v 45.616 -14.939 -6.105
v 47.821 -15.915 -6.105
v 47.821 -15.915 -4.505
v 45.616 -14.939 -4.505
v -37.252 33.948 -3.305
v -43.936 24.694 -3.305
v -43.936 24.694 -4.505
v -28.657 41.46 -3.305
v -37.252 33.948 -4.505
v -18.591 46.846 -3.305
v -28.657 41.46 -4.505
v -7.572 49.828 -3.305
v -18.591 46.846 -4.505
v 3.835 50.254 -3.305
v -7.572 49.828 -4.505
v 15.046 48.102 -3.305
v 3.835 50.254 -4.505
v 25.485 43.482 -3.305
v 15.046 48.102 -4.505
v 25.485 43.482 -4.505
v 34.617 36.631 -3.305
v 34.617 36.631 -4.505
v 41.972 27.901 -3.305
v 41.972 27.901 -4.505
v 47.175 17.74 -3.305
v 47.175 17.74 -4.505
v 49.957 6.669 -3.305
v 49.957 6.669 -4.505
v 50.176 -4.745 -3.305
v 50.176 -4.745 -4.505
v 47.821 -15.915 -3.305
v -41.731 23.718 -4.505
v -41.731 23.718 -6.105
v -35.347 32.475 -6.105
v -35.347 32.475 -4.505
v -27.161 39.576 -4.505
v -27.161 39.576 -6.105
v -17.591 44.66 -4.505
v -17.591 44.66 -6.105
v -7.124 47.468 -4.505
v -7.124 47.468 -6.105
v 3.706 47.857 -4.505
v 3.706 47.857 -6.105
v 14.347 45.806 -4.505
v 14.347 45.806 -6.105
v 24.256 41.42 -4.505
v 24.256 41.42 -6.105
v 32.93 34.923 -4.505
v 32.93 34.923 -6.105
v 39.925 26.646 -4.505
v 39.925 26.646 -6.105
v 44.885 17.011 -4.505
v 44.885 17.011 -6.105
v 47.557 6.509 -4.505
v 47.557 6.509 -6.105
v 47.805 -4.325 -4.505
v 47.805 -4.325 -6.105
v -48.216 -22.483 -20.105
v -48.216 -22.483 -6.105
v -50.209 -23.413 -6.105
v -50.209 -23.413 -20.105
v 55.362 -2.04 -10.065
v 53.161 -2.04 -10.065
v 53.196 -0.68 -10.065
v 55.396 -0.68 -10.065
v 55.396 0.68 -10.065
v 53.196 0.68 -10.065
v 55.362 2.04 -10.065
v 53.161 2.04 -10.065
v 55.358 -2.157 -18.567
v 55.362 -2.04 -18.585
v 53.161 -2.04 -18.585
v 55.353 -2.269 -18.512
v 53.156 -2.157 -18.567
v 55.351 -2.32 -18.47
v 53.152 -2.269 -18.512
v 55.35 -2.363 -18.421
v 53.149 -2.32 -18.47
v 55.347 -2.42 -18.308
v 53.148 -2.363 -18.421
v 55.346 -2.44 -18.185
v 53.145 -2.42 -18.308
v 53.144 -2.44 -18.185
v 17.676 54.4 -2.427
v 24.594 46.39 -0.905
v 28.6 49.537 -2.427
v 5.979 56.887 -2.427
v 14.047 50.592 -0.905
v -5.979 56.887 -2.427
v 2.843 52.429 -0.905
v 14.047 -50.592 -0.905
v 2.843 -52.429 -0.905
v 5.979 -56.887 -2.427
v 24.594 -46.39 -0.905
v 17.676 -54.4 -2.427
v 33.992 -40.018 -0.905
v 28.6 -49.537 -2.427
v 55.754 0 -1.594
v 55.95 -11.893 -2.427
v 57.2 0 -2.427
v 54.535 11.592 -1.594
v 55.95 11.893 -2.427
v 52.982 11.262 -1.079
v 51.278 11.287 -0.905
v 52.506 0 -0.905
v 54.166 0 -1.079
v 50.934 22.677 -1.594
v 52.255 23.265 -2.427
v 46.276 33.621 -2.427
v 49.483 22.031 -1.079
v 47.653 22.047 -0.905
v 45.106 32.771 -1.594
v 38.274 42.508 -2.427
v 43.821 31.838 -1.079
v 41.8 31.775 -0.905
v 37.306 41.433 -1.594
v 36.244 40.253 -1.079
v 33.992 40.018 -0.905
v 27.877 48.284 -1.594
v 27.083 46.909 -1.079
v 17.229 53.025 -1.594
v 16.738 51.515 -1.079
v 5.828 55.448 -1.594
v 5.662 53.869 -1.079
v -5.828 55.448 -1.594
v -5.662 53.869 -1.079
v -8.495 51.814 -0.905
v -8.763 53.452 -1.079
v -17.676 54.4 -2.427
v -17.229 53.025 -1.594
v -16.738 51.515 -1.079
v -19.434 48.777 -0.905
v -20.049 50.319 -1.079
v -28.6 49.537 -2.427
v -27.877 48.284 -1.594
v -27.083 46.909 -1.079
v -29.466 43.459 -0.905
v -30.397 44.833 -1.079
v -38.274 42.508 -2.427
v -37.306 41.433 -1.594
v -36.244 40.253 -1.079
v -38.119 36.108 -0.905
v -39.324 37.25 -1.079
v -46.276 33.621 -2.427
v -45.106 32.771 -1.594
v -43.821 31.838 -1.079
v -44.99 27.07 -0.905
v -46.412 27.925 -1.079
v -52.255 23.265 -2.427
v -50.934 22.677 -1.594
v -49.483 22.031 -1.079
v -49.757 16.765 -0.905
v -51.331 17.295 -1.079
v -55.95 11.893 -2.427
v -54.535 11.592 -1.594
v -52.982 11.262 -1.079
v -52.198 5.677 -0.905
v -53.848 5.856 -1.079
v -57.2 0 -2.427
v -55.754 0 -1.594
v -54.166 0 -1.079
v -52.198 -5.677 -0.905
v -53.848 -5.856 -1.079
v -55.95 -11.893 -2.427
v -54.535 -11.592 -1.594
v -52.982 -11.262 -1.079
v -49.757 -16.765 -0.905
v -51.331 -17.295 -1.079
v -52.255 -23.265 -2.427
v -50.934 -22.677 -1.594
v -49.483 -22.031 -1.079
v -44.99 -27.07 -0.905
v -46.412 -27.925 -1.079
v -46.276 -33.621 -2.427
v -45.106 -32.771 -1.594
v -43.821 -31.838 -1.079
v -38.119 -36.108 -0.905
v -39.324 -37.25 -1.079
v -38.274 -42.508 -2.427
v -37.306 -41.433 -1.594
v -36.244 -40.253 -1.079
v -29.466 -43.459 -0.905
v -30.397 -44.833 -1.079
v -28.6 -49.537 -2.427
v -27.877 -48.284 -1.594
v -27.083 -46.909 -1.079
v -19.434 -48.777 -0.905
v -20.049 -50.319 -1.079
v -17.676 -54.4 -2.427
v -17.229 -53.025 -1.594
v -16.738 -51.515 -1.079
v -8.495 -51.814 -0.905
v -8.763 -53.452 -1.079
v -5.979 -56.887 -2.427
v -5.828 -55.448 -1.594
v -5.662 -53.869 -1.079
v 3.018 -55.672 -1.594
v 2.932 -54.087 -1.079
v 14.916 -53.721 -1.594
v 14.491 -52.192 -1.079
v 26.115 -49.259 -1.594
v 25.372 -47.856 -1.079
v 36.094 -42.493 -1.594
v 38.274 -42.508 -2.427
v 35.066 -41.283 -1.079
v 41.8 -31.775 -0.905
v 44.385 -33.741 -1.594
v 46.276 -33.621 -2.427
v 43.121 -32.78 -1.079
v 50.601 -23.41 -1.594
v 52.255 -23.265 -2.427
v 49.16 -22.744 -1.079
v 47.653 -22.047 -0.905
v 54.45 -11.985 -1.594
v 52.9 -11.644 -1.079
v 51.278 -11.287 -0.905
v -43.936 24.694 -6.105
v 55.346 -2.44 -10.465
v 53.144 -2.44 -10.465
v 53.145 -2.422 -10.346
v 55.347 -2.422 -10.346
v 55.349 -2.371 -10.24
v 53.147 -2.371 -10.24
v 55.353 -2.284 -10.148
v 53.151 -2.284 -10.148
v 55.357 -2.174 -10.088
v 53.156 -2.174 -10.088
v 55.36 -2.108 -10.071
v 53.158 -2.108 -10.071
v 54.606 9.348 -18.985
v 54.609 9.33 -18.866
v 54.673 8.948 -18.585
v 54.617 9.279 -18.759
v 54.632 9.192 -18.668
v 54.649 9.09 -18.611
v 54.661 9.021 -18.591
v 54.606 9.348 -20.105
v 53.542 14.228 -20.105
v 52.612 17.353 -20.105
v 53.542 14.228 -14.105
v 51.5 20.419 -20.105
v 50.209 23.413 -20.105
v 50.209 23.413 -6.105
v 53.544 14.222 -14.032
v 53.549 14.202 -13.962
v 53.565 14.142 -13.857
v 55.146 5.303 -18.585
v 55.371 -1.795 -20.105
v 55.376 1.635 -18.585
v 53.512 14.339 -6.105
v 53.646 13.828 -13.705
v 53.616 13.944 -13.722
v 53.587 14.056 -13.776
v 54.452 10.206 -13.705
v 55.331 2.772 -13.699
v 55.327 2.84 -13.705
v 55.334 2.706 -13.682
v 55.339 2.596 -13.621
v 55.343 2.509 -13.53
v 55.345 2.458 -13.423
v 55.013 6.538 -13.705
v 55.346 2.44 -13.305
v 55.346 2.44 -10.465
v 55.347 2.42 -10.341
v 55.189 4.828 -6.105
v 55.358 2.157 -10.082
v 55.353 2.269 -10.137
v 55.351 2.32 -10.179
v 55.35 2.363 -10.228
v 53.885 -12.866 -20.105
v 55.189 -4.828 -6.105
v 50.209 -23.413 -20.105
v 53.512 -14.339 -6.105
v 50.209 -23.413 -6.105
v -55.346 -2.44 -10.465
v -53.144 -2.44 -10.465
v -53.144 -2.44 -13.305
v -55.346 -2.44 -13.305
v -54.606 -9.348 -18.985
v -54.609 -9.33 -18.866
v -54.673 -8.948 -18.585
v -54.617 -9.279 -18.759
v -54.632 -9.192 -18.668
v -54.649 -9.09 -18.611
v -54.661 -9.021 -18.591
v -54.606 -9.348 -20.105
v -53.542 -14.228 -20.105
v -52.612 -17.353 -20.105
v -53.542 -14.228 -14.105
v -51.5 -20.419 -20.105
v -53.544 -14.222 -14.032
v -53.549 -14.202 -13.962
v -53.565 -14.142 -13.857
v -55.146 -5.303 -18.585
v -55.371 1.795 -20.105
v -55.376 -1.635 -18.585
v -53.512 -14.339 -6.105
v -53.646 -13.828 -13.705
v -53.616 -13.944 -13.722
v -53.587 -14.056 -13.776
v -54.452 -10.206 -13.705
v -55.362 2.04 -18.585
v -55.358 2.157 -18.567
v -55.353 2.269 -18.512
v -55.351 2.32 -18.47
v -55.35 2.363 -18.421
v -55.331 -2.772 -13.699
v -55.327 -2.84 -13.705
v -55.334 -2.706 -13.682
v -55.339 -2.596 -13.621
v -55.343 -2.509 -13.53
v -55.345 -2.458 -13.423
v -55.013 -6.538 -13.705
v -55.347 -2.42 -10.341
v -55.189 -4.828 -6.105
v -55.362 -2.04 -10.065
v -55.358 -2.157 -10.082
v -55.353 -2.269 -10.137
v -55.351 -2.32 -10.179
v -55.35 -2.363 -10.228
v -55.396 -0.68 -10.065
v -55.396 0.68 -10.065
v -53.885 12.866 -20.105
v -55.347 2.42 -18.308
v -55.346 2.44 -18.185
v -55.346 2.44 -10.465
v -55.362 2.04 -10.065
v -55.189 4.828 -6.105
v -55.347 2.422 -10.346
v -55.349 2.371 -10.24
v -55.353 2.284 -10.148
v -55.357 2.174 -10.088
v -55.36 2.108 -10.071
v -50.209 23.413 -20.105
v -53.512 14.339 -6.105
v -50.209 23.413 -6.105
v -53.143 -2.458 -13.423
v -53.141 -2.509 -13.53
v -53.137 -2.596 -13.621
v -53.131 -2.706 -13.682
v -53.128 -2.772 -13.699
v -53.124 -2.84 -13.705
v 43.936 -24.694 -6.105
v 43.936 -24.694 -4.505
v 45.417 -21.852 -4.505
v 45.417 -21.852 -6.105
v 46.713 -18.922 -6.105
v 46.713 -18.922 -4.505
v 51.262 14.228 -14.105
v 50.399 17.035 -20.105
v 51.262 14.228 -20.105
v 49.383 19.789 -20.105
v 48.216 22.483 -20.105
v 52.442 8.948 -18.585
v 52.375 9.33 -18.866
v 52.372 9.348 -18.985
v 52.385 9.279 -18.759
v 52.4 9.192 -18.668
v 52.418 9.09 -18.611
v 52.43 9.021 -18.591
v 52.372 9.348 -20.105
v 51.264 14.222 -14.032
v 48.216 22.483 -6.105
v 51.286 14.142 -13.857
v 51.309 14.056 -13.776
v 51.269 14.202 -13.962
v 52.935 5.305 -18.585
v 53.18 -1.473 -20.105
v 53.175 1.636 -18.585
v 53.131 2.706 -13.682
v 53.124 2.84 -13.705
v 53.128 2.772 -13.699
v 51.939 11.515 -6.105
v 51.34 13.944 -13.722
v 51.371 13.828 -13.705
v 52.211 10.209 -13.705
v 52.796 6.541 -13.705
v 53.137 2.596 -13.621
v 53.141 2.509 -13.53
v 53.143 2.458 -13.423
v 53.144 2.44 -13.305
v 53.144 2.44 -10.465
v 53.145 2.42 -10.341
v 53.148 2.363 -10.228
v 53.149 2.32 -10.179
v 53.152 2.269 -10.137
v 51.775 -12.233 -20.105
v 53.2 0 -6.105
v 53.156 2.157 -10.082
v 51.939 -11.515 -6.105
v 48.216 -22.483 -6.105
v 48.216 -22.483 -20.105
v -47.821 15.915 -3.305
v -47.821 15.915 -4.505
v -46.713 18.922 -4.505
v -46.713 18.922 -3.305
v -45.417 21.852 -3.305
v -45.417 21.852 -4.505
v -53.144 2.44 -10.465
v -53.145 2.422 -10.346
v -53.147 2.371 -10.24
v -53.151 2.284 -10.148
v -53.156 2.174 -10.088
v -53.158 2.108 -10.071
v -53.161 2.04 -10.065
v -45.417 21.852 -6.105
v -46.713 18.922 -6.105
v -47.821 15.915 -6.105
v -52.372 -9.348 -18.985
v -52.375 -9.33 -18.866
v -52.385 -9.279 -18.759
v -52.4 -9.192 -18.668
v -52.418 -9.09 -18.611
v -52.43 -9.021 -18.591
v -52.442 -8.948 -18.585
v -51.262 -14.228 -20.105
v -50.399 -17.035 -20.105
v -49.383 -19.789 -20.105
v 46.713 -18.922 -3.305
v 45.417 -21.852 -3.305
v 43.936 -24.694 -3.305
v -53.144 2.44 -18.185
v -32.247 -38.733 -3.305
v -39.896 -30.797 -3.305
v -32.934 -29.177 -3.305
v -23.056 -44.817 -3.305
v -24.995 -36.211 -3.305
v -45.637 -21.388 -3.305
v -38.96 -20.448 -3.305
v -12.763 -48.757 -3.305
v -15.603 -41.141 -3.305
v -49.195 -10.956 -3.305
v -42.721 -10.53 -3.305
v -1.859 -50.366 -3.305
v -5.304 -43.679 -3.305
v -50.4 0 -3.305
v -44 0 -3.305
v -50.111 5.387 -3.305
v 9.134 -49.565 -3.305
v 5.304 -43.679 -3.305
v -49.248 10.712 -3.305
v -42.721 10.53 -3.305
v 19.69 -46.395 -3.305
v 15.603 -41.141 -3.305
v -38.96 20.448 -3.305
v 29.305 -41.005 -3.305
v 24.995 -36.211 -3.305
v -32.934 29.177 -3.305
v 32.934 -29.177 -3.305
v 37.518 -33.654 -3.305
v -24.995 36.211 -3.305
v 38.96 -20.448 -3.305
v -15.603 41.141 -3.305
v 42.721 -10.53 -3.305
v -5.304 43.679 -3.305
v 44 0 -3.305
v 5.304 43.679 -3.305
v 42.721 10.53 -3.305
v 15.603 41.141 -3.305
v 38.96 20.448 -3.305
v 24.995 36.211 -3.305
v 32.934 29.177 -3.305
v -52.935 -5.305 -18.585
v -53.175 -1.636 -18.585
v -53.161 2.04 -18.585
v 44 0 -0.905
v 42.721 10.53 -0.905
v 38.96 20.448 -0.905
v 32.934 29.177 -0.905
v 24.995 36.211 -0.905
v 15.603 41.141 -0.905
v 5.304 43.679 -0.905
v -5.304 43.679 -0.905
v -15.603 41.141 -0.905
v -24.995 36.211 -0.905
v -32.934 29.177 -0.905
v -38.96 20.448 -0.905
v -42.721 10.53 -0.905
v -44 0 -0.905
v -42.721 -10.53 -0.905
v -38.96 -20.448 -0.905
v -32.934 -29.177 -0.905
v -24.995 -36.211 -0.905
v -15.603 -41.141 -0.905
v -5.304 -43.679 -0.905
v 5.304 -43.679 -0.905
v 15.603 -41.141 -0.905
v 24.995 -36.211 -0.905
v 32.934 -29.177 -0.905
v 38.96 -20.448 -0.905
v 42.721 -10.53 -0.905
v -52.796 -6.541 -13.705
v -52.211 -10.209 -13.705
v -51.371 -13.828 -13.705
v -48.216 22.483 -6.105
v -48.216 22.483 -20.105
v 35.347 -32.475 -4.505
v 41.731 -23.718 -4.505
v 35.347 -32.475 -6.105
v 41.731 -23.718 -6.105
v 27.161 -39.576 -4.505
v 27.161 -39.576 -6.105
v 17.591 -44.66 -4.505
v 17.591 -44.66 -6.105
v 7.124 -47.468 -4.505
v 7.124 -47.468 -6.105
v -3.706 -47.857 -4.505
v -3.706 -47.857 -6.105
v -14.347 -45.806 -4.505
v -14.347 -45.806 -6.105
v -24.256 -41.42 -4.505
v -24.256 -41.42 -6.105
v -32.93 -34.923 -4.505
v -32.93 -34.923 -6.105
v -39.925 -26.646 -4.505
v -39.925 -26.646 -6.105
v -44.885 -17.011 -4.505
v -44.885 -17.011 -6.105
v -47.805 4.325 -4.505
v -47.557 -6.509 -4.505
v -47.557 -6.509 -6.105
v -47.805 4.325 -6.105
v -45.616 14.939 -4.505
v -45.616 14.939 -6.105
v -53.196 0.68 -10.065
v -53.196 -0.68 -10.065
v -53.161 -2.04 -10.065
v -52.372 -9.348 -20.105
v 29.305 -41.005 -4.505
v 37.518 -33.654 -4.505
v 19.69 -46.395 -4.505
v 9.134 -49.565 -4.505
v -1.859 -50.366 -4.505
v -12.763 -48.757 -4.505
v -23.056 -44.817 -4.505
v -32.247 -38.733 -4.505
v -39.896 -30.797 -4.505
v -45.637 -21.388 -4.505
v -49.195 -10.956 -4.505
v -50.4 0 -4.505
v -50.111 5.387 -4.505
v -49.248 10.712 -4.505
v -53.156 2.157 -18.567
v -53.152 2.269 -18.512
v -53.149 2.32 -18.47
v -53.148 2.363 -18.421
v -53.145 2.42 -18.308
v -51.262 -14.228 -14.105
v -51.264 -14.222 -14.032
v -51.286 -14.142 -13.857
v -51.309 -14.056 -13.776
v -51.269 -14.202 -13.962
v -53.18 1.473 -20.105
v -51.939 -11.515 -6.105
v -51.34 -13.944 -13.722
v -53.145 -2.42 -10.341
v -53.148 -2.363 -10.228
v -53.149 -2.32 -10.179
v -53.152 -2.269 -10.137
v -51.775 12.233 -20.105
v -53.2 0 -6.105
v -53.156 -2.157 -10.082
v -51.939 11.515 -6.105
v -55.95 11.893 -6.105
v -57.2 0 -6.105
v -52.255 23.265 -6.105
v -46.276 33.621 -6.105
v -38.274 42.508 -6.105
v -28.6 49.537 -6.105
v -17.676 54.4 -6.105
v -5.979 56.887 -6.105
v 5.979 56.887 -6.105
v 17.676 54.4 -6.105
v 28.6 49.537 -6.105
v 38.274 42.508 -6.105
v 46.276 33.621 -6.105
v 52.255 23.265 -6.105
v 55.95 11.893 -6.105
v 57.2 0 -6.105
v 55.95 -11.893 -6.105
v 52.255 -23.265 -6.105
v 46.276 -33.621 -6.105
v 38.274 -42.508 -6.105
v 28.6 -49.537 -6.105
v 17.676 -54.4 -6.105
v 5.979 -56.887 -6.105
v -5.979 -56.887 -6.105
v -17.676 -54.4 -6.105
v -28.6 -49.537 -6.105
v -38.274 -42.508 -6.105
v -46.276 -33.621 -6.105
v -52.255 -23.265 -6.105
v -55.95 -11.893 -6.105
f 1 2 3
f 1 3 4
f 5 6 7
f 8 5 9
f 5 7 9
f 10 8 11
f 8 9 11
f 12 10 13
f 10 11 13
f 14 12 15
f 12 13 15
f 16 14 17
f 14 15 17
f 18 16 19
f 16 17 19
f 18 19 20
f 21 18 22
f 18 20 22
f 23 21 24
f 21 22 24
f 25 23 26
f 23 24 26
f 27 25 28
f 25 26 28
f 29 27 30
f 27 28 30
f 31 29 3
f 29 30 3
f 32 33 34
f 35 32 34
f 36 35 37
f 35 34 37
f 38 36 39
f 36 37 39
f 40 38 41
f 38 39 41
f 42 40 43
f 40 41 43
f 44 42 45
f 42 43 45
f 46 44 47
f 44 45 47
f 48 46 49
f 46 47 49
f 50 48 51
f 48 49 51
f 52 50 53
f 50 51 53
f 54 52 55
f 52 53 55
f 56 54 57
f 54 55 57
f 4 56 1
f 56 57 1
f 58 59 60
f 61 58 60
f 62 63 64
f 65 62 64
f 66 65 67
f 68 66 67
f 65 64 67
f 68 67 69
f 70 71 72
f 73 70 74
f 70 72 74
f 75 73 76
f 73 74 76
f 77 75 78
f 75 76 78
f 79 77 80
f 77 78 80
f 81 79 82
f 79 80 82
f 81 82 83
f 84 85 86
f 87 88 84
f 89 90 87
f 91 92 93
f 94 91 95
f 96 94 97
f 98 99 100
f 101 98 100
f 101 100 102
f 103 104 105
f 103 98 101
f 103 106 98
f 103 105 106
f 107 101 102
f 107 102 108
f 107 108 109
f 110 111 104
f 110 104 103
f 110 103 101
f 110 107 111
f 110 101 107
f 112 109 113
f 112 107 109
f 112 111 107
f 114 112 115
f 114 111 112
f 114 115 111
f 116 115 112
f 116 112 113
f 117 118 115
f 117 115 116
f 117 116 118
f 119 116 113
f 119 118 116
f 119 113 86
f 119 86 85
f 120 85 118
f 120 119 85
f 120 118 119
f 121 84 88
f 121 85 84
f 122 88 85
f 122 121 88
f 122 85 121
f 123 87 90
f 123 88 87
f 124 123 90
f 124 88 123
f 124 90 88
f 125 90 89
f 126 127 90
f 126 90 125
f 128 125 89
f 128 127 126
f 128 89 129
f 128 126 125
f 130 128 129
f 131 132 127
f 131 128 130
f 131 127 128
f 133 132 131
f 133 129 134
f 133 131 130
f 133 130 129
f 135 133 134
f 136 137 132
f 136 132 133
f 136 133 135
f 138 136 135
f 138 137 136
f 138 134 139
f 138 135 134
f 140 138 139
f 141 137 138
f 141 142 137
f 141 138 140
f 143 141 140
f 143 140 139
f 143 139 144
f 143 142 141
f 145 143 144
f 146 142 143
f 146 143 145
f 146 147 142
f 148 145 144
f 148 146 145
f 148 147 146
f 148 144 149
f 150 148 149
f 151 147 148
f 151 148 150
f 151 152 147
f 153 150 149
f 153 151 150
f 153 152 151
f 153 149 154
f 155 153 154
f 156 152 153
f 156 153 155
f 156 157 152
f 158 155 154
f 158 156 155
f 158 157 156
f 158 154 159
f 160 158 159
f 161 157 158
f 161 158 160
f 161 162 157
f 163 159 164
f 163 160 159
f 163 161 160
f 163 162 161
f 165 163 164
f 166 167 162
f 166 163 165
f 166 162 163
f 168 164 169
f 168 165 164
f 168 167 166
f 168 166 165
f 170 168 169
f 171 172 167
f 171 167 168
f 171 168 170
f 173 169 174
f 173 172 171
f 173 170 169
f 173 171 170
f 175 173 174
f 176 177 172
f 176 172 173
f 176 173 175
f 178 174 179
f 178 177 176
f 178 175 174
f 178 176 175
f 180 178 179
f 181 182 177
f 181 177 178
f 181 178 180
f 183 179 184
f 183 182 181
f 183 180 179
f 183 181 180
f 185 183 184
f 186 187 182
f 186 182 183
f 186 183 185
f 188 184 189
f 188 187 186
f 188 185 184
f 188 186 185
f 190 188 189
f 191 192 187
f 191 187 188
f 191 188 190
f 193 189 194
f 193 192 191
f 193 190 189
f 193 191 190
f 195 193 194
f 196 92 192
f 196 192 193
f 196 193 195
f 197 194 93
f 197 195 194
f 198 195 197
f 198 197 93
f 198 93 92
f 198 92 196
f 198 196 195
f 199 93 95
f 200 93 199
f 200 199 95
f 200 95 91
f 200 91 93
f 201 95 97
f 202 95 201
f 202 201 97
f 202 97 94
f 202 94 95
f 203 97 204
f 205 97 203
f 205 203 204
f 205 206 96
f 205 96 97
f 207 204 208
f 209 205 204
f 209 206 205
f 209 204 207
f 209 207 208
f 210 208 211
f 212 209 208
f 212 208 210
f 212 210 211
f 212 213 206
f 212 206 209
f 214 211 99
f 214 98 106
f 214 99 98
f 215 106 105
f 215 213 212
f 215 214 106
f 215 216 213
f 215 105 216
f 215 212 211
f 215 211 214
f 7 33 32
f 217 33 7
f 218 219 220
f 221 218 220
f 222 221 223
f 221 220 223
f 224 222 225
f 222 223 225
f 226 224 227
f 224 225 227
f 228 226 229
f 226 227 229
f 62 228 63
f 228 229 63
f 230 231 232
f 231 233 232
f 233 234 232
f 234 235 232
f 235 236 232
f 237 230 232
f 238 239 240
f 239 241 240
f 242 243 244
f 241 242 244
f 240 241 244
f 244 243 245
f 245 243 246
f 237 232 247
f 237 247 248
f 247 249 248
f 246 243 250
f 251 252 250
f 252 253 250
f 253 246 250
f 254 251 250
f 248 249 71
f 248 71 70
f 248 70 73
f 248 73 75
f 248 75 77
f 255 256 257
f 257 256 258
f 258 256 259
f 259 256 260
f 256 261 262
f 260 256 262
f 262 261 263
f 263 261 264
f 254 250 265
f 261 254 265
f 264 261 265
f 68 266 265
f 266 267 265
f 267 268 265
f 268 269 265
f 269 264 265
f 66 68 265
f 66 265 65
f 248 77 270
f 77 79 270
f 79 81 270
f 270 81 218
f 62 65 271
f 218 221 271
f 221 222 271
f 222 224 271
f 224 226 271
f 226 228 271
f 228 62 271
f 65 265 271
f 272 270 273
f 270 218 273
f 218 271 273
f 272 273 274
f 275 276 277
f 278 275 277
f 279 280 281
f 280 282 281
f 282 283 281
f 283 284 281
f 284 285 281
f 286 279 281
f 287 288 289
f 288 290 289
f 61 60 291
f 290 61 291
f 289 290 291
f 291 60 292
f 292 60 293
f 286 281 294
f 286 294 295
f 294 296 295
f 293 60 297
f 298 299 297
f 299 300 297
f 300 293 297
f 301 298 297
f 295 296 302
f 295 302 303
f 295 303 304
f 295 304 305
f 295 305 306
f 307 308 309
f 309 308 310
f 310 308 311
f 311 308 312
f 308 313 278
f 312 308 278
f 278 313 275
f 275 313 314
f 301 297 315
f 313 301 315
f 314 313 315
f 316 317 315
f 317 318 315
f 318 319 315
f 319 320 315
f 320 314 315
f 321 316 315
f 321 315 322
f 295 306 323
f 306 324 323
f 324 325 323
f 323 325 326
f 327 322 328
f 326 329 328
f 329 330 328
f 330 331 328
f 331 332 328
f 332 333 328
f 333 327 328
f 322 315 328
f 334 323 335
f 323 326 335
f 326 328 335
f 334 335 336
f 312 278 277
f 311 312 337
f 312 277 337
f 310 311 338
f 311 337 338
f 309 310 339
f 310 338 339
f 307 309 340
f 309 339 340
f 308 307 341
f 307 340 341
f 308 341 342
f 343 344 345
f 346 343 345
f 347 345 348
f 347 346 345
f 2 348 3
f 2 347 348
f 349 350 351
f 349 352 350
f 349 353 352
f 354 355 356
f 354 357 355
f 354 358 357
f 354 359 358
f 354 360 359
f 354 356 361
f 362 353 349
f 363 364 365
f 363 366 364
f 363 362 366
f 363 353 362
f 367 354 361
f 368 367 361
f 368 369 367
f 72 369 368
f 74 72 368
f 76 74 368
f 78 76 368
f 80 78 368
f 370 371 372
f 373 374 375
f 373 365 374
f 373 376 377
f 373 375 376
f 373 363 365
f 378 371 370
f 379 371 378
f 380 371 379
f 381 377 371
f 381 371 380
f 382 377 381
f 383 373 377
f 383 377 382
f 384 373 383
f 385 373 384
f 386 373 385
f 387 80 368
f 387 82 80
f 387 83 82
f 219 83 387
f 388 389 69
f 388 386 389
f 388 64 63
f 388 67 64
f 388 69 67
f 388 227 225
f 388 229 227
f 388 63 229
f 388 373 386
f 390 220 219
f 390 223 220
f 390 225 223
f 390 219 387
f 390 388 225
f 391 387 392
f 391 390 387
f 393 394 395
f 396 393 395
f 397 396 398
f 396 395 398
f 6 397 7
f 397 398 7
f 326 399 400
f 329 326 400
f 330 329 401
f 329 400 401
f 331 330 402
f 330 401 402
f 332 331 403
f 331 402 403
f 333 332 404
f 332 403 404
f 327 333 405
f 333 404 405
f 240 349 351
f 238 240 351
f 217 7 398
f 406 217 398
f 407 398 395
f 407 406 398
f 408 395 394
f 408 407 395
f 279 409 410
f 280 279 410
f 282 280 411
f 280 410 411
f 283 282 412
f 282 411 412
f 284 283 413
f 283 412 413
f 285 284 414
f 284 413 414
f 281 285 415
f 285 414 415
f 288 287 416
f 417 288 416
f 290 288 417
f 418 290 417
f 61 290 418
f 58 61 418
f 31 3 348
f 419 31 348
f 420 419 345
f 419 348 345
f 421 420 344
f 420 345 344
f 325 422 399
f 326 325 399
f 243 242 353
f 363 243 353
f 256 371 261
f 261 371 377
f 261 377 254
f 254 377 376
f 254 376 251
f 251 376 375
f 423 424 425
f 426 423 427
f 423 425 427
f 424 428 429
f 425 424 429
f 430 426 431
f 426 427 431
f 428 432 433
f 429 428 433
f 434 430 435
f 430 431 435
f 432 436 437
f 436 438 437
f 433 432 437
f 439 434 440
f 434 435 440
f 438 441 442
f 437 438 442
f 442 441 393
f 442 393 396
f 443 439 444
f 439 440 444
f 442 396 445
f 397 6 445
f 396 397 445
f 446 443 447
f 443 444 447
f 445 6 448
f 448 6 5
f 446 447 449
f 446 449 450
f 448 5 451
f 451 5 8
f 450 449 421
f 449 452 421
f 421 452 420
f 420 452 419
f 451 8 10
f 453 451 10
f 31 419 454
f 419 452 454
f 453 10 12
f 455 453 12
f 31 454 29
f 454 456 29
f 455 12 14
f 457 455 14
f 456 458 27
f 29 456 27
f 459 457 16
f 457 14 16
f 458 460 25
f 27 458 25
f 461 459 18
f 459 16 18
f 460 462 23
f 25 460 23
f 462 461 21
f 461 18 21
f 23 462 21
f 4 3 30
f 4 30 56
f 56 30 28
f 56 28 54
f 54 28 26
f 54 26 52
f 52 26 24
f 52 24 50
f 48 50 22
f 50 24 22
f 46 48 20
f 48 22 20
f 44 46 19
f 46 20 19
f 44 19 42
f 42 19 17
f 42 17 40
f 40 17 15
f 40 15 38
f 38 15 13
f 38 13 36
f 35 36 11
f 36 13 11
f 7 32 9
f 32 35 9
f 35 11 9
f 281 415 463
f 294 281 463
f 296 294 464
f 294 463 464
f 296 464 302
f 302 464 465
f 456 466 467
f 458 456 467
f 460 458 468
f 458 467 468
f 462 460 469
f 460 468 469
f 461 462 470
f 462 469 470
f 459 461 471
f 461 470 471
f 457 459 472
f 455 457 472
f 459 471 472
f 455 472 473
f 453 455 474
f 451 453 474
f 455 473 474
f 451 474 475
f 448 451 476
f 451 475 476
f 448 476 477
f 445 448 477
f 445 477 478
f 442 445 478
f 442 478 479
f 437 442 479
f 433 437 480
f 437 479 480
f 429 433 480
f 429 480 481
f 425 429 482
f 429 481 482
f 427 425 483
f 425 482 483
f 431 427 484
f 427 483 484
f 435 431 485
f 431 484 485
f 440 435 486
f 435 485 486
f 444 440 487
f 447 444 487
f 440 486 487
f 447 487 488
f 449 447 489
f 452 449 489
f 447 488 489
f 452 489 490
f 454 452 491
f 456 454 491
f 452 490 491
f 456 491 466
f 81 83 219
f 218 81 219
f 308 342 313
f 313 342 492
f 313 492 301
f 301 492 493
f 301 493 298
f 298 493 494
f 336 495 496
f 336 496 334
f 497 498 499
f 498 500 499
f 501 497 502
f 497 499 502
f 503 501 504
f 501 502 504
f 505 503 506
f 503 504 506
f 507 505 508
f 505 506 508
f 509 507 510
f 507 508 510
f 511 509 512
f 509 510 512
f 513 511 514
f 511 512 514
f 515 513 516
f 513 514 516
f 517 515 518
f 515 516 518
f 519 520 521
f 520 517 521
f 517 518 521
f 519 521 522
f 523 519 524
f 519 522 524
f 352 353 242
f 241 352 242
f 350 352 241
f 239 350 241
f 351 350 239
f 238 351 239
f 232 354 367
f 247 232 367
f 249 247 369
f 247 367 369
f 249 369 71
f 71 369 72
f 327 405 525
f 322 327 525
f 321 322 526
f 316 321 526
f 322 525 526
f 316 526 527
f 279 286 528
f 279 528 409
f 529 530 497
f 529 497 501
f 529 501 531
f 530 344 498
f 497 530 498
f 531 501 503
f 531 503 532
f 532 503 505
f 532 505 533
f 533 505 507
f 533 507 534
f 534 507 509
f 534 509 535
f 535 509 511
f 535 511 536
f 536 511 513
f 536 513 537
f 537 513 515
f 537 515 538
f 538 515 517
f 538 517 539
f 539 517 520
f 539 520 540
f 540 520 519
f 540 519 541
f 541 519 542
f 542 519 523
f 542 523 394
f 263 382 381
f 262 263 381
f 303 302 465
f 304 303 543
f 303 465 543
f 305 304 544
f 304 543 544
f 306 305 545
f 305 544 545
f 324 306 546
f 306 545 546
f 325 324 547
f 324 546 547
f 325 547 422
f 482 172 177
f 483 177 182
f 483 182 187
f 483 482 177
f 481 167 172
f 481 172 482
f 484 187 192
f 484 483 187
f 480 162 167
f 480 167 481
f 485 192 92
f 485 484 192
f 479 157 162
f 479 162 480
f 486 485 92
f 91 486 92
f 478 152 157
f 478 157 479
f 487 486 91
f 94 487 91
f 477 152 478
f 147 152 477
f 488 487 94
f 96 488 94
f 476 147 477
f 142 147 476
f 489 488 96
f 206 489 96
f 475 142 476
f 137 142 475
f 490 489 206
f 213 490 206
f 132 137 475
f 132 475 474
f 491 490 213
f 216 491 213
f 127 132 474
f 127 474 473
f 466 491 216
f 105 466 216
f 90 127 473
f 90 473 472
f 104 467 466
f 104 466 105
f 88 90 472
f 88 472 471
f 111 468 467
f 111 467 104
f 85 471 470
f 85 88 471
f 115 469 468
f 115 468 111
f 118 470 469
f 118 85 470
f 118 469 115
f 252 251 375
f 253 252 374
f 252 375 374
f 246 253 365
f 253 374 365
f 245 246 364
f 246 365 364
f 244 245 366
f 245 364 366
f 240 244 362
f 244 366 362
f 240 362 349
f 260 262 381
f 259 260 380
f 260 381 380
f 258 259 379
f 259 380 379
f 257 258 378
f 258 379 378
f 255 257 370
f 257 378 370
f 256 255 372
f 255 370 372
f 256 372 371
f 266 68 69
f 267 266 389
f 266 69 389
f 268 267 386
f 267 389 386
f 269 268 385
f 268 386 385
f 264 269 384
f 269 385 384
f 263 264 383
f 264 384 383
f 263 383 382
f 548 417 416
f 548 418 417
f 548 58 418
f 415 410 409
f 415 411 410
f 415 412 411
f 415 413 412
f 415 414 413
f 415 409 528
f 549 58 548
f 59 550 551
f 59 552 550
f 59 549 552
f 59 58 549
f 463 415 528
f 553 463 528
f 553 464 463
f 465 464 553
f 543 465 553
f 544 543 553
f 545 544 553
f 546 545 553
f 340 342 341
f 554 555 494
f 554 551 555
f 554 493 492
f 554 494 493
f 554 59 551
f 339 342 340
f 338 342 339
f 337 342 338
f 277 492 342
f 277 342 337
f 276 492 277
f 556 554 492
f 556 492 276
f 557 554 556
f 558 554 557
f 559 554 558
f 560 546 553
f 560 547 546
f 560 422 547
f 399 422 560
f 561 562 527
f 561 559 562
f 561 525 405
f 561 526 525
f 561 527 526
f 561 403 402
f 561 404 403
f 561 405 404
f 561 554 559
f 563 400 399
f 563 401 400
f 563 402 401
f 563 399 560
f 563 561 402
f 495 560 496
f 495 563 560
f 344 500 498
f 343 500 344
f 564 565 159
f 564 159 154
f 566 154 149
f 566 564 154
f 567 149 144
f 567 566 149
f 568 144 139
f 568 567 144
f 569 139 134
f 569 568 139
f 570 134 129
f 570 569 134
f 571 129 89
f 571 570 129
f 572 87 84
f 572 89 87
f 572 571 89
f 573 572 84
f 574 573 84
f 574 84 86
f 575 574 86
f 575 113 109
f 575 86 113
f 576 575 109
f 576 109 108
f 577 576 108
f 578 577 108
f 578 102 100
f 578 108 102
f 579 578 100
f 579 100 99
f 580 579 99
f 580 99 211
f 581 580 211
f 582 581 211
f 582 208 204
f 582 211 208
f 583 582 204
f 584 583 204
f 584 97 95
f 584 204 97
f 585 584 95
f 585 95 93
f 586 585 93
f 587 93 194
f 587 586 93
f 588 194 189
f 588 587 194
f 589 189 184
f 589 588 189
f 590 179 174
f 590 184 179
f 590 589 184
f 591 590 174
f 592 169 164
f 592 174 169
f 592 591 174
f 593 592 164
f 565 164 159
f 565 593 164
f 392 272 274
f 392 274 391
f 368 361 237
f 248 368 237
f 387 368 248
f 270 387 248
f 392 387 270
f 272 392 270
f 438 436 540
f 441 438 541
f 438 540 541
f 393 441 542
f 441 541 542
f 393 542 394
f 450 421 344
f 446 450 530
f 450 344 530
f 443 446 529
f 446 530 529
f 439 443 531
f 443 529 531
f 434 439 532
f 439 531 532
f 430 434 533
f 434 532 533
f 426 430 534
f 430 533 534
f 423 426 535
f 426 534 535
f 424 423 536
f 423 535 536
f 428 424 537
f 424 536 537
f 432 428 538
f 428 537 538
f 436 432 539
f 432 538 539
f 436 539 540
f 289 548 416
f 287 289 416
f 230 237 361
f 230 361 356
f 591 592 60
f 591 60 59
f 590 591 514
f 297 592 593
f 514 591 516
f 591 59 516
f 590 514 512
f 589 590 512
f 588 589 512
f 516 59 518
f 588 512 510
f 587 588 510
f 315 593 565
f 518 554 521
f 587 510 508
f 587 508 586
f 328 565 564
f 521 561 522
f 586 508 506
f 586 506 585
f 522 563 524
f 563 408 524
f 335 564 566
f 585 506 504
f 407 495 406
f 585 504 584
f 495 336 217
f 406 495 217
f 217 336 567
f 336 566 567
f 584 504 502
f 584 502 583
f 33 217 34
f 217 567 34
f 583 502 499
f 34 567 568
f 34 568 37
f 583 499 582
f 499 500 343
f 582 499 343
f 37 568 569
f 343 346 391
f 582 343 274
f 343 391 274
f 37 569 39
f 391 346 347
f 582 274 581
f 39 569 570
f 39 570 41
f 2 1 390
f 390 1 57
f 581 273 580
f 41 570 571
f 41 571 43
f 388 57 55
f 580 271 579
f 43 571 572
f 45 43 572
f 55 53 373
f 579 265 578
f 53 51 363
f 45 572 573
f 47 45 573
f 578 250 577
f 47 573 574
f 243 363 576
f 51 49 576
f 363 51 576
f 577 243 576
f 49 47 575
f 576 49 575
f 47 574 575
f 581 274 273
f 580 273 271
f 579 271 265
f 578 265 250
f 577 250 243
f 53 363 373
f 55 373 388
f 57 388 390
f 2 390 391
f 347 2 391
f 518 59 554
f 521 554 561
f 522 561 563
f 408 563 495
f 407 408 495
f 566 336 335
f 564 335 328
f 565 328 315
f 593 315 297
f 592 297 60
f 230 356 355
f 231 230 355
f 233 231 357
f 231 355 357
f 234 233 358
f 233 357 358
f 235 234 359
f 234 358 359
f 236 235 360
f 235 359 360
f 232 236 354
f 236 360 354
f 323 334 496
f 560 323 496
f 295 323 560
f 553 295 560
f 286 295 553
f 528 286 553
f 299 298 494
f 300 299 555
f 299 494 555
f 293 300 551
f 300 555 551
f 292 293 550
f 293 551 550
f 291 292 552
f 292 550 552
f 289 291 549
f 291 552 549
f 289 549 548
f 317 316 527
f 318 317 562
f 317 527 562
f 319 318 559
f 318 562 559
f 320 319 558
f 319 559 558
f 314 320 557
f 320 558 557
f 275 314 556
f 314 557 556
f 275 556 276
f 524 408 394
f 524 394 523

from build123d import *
from build123d.topology import SkipClean

# Parameters (mm, degrees)
CROQUIS1_R              = 75
SALIENTE_EXTRUIR1_DEPTH = 6.5
CROQUIS2_R              = 69.25
CROQUIS2_R_2            = 66.5
SALIENTE_EXTRUIR2_DEPTH = 17.5
REDONDEO1_R             = 10
CROQUIS5_R              = 60
CORTAR_EXTRUIR2_DEPTH   = 121.5
CORTAR_EXTRUIR3_START   = 121.5
CROQUIS6_R              = 66.5
CORTAR_EXTRUIR3_DEPTH   = 121.5
CORTAR_EXTRUIR4_START   = -2
CROQUIS7_R              = 63
CROQUIS7_R_2            = 60
CORTAR_EXTRUIR4_DEPTH   = 1.5
CORTAR_EXTRUIR5_DEPTH   = 3.5
CROQUIS9_R              = 65.632503002
CROQUIS9_R_2            = 55
SALIENTE_EXTRUIR3_DEPTH = 3
CORTAR_EXTRUIR7_DEPTH   = 90
MATRIZC1_COUNT          = 2
CROQUIS11_OUTSIDE_W     = 194.698
CROQUIS11_OUTSIDE_H     = 194.698
CROQUIS11_OUTSIDE_R     = 71.5
CORTAR_EXTRUIR8_DEPTH   = 61
ESCALA1_SCALE           = 0.8


with BuildPart() as part:
    # Croquis1 → Saliente-Extruir1 (new body)
    with BuildSketch(Plane.XY):
        Circle(CROQUIS1_R)
    extrude(amount=-SALIENTE_EXTRUIR1_DEPTH)

    # Croquis2 → Saliente-Extruir2 (add)
    with BuildSketch(Plane(origin=(0, 0, -6.5), x_dir=(-1, 0, 0), z_dir=(0, 0, -1))):
        with Locations(Location((0, 0, 0), (0, 0, 180))):
            Circle(CROQUIS2_R)
        Circle(CROQUIS2_R_2, mode=Mode.SUBTRACT)
    extrude(amount=SALIENTE_EXTRUIR2_DEPTH)

    # Redondeo1
    # the kernel refuses this fillet: 10 mm, written as the material it takes off along each edge
    with BuildSketch(Plane(origin=(0, 0, 0), x_dir=(1, 0, 0), z_dir=(0, -1, 0))) as redondeo1_piece_1:
        with BuildLine():
            CenterArc((65.632503002, -10), REDONDEO1_R, 20.487315115, 69.512684885)
            Line((65.632503002, 0), (65.632503002, 0.2))
            Line((65.632503002, 0.2), (75, 0.2))
            Line((75, 0.2), (75.2, 0))
            ThreePointArc((75.2, 0), (75.2, -3.25), (75.18734994, -6.43))
            Line((75.18734994, -6.43), (75, -6.5))
        make_face()
    revolve(axis=Axis((0, 0, 0), (0, 0, 1)), mode=Mode.SUBTRACT)

    # Croquis5 → Cortar-Extruir2 (cut)
    with BuildSketch(Plane(origin=(0, 0, -6.5), x_dir=(-1, 0, 0), z_dir=(0, 0, -1))):
        Circle(CROQUIS5_R)
    extrude(amount=-CORTAR_EXTRUIR2_DEPTH, mode=Mode.SUBTRACT)

    # Croquis6 → Cortar-Extruir3 (cut)
    with BuildSketch(Plane(origin=(0, 0, -6.5), x_dir=(-1, 0, 0), z_dir=(0, 0, -1)).offset(CORTAR_EXTRUIR3_START)):
        with BuildLine():
            ThreePointArc((53.795389167, 0), (-11.643453263, -52.520223645), (-48.755180109, 22.734913859))
            Line((-48.755180109, 22.734913859), (-54.378467222, 25.357095704))
            ThreePointArc((-54.378467222, 25.357095704), (-12.986376836, -58.577760427), (60, 0))
            ThreePointArc((60, 0), (58.577760427, 12.986376836), (54.378467222, 25.357095704))
            Line((54.378467222, 25.357095704), (48.755180109, 22.734913859))
            ThreePointArc((48.755180109, 22.734913859), (52.520223645, 11.643453263), (53.795389167, 0))
        make_face()
        with BuildLine():
            Line((-54.378467222, 25.357095704), (-48.755180109, 22.734913859))
            ThreePointArc((-48.755180109, 22.734913859), (0, 53.795389167), (48.755180109, 22.734913859))
            Line((48.755180109, 22.734913859), (54.378467222, 25.357095704))
            ThreePointArc((54.378467222, 25.357095704), (0, 60), (-54.378467222, 25.357095704))
        make_face()
        Circle(CROQUIS6_R)
        with BuildLine():
            Line((0, 0), (76.100368106, 35.486184436))
            ThreePointArc((76.100368106, 35.486184436), (0, 83.967465793), (-76.100368106, 35.486184436))
            Line((-76.100368106, 35.486184436), (0, 0))
        make_face()
        with BuildLine():
            ThreePointArc((60, 0), (-12.986376836, -58.577760427), (-54.378467222, 25.357095704))
            Line((-54.378467222, 25.357095704), (-60.269467838, 28.104114406))
            ThreePointArc((-60.269467838, 28.104114406), (-14.393234327, -64.923684473), (66.5, 0))
            ThreePointArc((66.5, 0), (64.923684473, 14.393234327), (60.269467838, 28.104114406))
            Line((60.269467838, 28.104114406), (54.378467222, 25.357095704))
            ThreePointArc((54.378467222, 25.357095704), (58.577760427, 12.986376836), (60, 0))
        make_face()
        with BuildLine():
            Line((-60.269467838, 28.104114406), (-54.378467222, 25.357095704))
            ThreePointArc((-54.378467222, 25.357095704), (0, 60), (54.378467222, 25.357095704))
            Line((54.378467222, 25.357095704), (60.269467838, 28.104114406))
            ThreePointArc((60.269467838, 28.104114406), (0, 66.5), (-60.269467838, 28.104114406))
        make_face()
    cortar_extruir3 = extrude(amount=-CORTAR_EXTRUIR3_DEPTH, mode=Mode.SUBTRACT)

    # Croquis7 → Cortar-Extruir4 (cut)
    with BuildSketch(Plane(origin=(0, 0, -6.5), x_dir=(-1, 0, 0), z_dir=(0, 0, -1)).offset(CORTAR_EXTRUIR4_START)):
        Circle(CROQUIS7_R)
        Circle(CROQUIS7_R_2, mode=Mode.SUBTRACT)
    extrude(amount=-CORTAR_EXTRUIR4_DEPTH, mode=Mode.SUBTRACT)

    # Croquis8 → Cortar-Extruir5 (cut)
    with SkipClean():  # the faces are left unmerged after this step: merging them gives an invalid solid
        with BuildSketch(Plane(origin=(0, 0, -6.5), x_dir=(-1, 0, 0), z_dir=(0, 0, -1))):
            with BuildLine():
                Line((59.77659711, 19.893678341), (-54.920166384, -30.867058887))
                ThreePointArc((-54.920166384, -30.867058887), (-57.610247866, -25.49626131), (-59.77659711, -19.893678341))
                Line((-59.77659711, -19.893678341), (54.920166384, 30.867058887))
                ThreePointArc((54.920166384, 30.867058887), (57.610247866, 25.49626131), (59.77659711, 19.893678341))
            make_face()
        extrude(amount=-CORTAR_EXTRUIR5_DEPTH, mode=Mode.SUBTRACT)

    # Croquis9 → Saliente-Extruir3 (add)
    with SkipClean():  # the faces are left unmerged after this step: merging them gives an invalid solid
        with BuildSketch(Plane.XY):
            Circle(CROQUIS9_R)
            Circle(CROQUIS9_R_2, mode=Mode.SUBTRACT)
        extrude(amount=-SALIENTE_EXTRUIR3_DEPTH)

    # Simetría1: Cortar-Extruir3 across plane
    with SkipClean():  # the faces are left unmerged after this step: merging them gives an invalid solid
        add(cortar_extruir3.mirror(Plane.ZX), mode=Mode.SUBTRACT)

    # Croquis10 → Cortar-Extruir7 (cut)
    with SkipClean():  # the faces are left unmerged after this step: merging them gives an invalid solid
        with BuildSketch(Plane(origin=(0, 0, 0), x_dir=(0, 0, -1), z_dir=(1, 0, 0))):
            with BuildLine():
                Line((20.1, -17.78519151), (24, -17.78519151))
                Line((24, -17.78519151), (24, -11.68519151))
                Line((24, -11.68519151), (22.6, -11.68519151))
                ThreePointArc((22.6, -11.68519151), (22.246446609, -11.538744901), (22.1, -11.18519151))
                Line((22.1, -11.18519151), (22.1, -3.05))
                Line((22.1, -3.05), (22.1, 2.55))
                ThreePointArc((22.1, 2.55), (21.953553391, 2.903553391), (21.6, 3.05))
                Line((21.6, 3.05), (11.95, 3.05))
                ThreePointArc((11.95, 3.05), (11.596446609, 2.903553391), (11.45, 2.55))
                Line((11.45, 2.55), (11.45, -2.55))
                ThreePointArc((11.45, -2.55), (11.596446609, -2.903553391), (11.95, -3.05))
                Line((11.95, -3.05), (15.5, -3.05))
                ThreePointArc((15.5, -3.05), (15.853553391, -3.196446609), (16, -3.55))
                Line((16, -3.55), (16, -11.68519151))
                Line((16, -11.68519151), (16, -17.28519151))
                ThreePointArc((16, -17.28519151), (16.146446609, -17.638744901), (16.5, -17.78519151))
                Line((16.5, -17.78519151), (20.1, -17.78519151))
            make_face()
        cortar_extruir7 = extrude(amount=-CORTAR_EXTRUIR7_DEPTH, mode=Mode.SUBTRACT)

    # MatrizC1: Cortar-Extruir7 ×2 about axis
    with SkipClean():  # the faces are left unmerged after this step: merging them gives an invalid solid
        matrizc1_axis = Axis((0, 0, 0), (0, 0, 1))
        for i in range(1, MATRIZC1_COUNT):
            add(cortar_extruir7.rotate(matrizc1_axis, i * 360 / MATRIZC1_COUNT), mode=Mode.SUBTRACT)

    # Croquis11 outside → Cortar-Extruir8 (cut)
    with SkipClean():  # the faces are left unmerged after this step: merging them gives an invalid solid
        with BuildSketch(Plane(origin=(0, 0, -6.5), x_dir=(-1, 0, 0), z_dir=(0, 0, -1))):
            Rectangle(CROQUIS11_OUTSIDE_W, CROQUIS11_OUTSIDE_H)
            Circle(CROQUIS11_OUTSIDE_R, mode=Mode.SUBTRACT)
        extrude(amount=-CORTAR_EXTRUIR8_DEPTH, mode=Mode.SUBTRACT)


with BuildPart() as part_1:
    # Escala1: scaled about (1.06e-07, 2.2e-08, -4.523321709)
    add(part.part.scale(ESCALA1_SCALE).moved(Location((2.1e-08, 4e-09, -0.904664342))))


solid = part_1.part
